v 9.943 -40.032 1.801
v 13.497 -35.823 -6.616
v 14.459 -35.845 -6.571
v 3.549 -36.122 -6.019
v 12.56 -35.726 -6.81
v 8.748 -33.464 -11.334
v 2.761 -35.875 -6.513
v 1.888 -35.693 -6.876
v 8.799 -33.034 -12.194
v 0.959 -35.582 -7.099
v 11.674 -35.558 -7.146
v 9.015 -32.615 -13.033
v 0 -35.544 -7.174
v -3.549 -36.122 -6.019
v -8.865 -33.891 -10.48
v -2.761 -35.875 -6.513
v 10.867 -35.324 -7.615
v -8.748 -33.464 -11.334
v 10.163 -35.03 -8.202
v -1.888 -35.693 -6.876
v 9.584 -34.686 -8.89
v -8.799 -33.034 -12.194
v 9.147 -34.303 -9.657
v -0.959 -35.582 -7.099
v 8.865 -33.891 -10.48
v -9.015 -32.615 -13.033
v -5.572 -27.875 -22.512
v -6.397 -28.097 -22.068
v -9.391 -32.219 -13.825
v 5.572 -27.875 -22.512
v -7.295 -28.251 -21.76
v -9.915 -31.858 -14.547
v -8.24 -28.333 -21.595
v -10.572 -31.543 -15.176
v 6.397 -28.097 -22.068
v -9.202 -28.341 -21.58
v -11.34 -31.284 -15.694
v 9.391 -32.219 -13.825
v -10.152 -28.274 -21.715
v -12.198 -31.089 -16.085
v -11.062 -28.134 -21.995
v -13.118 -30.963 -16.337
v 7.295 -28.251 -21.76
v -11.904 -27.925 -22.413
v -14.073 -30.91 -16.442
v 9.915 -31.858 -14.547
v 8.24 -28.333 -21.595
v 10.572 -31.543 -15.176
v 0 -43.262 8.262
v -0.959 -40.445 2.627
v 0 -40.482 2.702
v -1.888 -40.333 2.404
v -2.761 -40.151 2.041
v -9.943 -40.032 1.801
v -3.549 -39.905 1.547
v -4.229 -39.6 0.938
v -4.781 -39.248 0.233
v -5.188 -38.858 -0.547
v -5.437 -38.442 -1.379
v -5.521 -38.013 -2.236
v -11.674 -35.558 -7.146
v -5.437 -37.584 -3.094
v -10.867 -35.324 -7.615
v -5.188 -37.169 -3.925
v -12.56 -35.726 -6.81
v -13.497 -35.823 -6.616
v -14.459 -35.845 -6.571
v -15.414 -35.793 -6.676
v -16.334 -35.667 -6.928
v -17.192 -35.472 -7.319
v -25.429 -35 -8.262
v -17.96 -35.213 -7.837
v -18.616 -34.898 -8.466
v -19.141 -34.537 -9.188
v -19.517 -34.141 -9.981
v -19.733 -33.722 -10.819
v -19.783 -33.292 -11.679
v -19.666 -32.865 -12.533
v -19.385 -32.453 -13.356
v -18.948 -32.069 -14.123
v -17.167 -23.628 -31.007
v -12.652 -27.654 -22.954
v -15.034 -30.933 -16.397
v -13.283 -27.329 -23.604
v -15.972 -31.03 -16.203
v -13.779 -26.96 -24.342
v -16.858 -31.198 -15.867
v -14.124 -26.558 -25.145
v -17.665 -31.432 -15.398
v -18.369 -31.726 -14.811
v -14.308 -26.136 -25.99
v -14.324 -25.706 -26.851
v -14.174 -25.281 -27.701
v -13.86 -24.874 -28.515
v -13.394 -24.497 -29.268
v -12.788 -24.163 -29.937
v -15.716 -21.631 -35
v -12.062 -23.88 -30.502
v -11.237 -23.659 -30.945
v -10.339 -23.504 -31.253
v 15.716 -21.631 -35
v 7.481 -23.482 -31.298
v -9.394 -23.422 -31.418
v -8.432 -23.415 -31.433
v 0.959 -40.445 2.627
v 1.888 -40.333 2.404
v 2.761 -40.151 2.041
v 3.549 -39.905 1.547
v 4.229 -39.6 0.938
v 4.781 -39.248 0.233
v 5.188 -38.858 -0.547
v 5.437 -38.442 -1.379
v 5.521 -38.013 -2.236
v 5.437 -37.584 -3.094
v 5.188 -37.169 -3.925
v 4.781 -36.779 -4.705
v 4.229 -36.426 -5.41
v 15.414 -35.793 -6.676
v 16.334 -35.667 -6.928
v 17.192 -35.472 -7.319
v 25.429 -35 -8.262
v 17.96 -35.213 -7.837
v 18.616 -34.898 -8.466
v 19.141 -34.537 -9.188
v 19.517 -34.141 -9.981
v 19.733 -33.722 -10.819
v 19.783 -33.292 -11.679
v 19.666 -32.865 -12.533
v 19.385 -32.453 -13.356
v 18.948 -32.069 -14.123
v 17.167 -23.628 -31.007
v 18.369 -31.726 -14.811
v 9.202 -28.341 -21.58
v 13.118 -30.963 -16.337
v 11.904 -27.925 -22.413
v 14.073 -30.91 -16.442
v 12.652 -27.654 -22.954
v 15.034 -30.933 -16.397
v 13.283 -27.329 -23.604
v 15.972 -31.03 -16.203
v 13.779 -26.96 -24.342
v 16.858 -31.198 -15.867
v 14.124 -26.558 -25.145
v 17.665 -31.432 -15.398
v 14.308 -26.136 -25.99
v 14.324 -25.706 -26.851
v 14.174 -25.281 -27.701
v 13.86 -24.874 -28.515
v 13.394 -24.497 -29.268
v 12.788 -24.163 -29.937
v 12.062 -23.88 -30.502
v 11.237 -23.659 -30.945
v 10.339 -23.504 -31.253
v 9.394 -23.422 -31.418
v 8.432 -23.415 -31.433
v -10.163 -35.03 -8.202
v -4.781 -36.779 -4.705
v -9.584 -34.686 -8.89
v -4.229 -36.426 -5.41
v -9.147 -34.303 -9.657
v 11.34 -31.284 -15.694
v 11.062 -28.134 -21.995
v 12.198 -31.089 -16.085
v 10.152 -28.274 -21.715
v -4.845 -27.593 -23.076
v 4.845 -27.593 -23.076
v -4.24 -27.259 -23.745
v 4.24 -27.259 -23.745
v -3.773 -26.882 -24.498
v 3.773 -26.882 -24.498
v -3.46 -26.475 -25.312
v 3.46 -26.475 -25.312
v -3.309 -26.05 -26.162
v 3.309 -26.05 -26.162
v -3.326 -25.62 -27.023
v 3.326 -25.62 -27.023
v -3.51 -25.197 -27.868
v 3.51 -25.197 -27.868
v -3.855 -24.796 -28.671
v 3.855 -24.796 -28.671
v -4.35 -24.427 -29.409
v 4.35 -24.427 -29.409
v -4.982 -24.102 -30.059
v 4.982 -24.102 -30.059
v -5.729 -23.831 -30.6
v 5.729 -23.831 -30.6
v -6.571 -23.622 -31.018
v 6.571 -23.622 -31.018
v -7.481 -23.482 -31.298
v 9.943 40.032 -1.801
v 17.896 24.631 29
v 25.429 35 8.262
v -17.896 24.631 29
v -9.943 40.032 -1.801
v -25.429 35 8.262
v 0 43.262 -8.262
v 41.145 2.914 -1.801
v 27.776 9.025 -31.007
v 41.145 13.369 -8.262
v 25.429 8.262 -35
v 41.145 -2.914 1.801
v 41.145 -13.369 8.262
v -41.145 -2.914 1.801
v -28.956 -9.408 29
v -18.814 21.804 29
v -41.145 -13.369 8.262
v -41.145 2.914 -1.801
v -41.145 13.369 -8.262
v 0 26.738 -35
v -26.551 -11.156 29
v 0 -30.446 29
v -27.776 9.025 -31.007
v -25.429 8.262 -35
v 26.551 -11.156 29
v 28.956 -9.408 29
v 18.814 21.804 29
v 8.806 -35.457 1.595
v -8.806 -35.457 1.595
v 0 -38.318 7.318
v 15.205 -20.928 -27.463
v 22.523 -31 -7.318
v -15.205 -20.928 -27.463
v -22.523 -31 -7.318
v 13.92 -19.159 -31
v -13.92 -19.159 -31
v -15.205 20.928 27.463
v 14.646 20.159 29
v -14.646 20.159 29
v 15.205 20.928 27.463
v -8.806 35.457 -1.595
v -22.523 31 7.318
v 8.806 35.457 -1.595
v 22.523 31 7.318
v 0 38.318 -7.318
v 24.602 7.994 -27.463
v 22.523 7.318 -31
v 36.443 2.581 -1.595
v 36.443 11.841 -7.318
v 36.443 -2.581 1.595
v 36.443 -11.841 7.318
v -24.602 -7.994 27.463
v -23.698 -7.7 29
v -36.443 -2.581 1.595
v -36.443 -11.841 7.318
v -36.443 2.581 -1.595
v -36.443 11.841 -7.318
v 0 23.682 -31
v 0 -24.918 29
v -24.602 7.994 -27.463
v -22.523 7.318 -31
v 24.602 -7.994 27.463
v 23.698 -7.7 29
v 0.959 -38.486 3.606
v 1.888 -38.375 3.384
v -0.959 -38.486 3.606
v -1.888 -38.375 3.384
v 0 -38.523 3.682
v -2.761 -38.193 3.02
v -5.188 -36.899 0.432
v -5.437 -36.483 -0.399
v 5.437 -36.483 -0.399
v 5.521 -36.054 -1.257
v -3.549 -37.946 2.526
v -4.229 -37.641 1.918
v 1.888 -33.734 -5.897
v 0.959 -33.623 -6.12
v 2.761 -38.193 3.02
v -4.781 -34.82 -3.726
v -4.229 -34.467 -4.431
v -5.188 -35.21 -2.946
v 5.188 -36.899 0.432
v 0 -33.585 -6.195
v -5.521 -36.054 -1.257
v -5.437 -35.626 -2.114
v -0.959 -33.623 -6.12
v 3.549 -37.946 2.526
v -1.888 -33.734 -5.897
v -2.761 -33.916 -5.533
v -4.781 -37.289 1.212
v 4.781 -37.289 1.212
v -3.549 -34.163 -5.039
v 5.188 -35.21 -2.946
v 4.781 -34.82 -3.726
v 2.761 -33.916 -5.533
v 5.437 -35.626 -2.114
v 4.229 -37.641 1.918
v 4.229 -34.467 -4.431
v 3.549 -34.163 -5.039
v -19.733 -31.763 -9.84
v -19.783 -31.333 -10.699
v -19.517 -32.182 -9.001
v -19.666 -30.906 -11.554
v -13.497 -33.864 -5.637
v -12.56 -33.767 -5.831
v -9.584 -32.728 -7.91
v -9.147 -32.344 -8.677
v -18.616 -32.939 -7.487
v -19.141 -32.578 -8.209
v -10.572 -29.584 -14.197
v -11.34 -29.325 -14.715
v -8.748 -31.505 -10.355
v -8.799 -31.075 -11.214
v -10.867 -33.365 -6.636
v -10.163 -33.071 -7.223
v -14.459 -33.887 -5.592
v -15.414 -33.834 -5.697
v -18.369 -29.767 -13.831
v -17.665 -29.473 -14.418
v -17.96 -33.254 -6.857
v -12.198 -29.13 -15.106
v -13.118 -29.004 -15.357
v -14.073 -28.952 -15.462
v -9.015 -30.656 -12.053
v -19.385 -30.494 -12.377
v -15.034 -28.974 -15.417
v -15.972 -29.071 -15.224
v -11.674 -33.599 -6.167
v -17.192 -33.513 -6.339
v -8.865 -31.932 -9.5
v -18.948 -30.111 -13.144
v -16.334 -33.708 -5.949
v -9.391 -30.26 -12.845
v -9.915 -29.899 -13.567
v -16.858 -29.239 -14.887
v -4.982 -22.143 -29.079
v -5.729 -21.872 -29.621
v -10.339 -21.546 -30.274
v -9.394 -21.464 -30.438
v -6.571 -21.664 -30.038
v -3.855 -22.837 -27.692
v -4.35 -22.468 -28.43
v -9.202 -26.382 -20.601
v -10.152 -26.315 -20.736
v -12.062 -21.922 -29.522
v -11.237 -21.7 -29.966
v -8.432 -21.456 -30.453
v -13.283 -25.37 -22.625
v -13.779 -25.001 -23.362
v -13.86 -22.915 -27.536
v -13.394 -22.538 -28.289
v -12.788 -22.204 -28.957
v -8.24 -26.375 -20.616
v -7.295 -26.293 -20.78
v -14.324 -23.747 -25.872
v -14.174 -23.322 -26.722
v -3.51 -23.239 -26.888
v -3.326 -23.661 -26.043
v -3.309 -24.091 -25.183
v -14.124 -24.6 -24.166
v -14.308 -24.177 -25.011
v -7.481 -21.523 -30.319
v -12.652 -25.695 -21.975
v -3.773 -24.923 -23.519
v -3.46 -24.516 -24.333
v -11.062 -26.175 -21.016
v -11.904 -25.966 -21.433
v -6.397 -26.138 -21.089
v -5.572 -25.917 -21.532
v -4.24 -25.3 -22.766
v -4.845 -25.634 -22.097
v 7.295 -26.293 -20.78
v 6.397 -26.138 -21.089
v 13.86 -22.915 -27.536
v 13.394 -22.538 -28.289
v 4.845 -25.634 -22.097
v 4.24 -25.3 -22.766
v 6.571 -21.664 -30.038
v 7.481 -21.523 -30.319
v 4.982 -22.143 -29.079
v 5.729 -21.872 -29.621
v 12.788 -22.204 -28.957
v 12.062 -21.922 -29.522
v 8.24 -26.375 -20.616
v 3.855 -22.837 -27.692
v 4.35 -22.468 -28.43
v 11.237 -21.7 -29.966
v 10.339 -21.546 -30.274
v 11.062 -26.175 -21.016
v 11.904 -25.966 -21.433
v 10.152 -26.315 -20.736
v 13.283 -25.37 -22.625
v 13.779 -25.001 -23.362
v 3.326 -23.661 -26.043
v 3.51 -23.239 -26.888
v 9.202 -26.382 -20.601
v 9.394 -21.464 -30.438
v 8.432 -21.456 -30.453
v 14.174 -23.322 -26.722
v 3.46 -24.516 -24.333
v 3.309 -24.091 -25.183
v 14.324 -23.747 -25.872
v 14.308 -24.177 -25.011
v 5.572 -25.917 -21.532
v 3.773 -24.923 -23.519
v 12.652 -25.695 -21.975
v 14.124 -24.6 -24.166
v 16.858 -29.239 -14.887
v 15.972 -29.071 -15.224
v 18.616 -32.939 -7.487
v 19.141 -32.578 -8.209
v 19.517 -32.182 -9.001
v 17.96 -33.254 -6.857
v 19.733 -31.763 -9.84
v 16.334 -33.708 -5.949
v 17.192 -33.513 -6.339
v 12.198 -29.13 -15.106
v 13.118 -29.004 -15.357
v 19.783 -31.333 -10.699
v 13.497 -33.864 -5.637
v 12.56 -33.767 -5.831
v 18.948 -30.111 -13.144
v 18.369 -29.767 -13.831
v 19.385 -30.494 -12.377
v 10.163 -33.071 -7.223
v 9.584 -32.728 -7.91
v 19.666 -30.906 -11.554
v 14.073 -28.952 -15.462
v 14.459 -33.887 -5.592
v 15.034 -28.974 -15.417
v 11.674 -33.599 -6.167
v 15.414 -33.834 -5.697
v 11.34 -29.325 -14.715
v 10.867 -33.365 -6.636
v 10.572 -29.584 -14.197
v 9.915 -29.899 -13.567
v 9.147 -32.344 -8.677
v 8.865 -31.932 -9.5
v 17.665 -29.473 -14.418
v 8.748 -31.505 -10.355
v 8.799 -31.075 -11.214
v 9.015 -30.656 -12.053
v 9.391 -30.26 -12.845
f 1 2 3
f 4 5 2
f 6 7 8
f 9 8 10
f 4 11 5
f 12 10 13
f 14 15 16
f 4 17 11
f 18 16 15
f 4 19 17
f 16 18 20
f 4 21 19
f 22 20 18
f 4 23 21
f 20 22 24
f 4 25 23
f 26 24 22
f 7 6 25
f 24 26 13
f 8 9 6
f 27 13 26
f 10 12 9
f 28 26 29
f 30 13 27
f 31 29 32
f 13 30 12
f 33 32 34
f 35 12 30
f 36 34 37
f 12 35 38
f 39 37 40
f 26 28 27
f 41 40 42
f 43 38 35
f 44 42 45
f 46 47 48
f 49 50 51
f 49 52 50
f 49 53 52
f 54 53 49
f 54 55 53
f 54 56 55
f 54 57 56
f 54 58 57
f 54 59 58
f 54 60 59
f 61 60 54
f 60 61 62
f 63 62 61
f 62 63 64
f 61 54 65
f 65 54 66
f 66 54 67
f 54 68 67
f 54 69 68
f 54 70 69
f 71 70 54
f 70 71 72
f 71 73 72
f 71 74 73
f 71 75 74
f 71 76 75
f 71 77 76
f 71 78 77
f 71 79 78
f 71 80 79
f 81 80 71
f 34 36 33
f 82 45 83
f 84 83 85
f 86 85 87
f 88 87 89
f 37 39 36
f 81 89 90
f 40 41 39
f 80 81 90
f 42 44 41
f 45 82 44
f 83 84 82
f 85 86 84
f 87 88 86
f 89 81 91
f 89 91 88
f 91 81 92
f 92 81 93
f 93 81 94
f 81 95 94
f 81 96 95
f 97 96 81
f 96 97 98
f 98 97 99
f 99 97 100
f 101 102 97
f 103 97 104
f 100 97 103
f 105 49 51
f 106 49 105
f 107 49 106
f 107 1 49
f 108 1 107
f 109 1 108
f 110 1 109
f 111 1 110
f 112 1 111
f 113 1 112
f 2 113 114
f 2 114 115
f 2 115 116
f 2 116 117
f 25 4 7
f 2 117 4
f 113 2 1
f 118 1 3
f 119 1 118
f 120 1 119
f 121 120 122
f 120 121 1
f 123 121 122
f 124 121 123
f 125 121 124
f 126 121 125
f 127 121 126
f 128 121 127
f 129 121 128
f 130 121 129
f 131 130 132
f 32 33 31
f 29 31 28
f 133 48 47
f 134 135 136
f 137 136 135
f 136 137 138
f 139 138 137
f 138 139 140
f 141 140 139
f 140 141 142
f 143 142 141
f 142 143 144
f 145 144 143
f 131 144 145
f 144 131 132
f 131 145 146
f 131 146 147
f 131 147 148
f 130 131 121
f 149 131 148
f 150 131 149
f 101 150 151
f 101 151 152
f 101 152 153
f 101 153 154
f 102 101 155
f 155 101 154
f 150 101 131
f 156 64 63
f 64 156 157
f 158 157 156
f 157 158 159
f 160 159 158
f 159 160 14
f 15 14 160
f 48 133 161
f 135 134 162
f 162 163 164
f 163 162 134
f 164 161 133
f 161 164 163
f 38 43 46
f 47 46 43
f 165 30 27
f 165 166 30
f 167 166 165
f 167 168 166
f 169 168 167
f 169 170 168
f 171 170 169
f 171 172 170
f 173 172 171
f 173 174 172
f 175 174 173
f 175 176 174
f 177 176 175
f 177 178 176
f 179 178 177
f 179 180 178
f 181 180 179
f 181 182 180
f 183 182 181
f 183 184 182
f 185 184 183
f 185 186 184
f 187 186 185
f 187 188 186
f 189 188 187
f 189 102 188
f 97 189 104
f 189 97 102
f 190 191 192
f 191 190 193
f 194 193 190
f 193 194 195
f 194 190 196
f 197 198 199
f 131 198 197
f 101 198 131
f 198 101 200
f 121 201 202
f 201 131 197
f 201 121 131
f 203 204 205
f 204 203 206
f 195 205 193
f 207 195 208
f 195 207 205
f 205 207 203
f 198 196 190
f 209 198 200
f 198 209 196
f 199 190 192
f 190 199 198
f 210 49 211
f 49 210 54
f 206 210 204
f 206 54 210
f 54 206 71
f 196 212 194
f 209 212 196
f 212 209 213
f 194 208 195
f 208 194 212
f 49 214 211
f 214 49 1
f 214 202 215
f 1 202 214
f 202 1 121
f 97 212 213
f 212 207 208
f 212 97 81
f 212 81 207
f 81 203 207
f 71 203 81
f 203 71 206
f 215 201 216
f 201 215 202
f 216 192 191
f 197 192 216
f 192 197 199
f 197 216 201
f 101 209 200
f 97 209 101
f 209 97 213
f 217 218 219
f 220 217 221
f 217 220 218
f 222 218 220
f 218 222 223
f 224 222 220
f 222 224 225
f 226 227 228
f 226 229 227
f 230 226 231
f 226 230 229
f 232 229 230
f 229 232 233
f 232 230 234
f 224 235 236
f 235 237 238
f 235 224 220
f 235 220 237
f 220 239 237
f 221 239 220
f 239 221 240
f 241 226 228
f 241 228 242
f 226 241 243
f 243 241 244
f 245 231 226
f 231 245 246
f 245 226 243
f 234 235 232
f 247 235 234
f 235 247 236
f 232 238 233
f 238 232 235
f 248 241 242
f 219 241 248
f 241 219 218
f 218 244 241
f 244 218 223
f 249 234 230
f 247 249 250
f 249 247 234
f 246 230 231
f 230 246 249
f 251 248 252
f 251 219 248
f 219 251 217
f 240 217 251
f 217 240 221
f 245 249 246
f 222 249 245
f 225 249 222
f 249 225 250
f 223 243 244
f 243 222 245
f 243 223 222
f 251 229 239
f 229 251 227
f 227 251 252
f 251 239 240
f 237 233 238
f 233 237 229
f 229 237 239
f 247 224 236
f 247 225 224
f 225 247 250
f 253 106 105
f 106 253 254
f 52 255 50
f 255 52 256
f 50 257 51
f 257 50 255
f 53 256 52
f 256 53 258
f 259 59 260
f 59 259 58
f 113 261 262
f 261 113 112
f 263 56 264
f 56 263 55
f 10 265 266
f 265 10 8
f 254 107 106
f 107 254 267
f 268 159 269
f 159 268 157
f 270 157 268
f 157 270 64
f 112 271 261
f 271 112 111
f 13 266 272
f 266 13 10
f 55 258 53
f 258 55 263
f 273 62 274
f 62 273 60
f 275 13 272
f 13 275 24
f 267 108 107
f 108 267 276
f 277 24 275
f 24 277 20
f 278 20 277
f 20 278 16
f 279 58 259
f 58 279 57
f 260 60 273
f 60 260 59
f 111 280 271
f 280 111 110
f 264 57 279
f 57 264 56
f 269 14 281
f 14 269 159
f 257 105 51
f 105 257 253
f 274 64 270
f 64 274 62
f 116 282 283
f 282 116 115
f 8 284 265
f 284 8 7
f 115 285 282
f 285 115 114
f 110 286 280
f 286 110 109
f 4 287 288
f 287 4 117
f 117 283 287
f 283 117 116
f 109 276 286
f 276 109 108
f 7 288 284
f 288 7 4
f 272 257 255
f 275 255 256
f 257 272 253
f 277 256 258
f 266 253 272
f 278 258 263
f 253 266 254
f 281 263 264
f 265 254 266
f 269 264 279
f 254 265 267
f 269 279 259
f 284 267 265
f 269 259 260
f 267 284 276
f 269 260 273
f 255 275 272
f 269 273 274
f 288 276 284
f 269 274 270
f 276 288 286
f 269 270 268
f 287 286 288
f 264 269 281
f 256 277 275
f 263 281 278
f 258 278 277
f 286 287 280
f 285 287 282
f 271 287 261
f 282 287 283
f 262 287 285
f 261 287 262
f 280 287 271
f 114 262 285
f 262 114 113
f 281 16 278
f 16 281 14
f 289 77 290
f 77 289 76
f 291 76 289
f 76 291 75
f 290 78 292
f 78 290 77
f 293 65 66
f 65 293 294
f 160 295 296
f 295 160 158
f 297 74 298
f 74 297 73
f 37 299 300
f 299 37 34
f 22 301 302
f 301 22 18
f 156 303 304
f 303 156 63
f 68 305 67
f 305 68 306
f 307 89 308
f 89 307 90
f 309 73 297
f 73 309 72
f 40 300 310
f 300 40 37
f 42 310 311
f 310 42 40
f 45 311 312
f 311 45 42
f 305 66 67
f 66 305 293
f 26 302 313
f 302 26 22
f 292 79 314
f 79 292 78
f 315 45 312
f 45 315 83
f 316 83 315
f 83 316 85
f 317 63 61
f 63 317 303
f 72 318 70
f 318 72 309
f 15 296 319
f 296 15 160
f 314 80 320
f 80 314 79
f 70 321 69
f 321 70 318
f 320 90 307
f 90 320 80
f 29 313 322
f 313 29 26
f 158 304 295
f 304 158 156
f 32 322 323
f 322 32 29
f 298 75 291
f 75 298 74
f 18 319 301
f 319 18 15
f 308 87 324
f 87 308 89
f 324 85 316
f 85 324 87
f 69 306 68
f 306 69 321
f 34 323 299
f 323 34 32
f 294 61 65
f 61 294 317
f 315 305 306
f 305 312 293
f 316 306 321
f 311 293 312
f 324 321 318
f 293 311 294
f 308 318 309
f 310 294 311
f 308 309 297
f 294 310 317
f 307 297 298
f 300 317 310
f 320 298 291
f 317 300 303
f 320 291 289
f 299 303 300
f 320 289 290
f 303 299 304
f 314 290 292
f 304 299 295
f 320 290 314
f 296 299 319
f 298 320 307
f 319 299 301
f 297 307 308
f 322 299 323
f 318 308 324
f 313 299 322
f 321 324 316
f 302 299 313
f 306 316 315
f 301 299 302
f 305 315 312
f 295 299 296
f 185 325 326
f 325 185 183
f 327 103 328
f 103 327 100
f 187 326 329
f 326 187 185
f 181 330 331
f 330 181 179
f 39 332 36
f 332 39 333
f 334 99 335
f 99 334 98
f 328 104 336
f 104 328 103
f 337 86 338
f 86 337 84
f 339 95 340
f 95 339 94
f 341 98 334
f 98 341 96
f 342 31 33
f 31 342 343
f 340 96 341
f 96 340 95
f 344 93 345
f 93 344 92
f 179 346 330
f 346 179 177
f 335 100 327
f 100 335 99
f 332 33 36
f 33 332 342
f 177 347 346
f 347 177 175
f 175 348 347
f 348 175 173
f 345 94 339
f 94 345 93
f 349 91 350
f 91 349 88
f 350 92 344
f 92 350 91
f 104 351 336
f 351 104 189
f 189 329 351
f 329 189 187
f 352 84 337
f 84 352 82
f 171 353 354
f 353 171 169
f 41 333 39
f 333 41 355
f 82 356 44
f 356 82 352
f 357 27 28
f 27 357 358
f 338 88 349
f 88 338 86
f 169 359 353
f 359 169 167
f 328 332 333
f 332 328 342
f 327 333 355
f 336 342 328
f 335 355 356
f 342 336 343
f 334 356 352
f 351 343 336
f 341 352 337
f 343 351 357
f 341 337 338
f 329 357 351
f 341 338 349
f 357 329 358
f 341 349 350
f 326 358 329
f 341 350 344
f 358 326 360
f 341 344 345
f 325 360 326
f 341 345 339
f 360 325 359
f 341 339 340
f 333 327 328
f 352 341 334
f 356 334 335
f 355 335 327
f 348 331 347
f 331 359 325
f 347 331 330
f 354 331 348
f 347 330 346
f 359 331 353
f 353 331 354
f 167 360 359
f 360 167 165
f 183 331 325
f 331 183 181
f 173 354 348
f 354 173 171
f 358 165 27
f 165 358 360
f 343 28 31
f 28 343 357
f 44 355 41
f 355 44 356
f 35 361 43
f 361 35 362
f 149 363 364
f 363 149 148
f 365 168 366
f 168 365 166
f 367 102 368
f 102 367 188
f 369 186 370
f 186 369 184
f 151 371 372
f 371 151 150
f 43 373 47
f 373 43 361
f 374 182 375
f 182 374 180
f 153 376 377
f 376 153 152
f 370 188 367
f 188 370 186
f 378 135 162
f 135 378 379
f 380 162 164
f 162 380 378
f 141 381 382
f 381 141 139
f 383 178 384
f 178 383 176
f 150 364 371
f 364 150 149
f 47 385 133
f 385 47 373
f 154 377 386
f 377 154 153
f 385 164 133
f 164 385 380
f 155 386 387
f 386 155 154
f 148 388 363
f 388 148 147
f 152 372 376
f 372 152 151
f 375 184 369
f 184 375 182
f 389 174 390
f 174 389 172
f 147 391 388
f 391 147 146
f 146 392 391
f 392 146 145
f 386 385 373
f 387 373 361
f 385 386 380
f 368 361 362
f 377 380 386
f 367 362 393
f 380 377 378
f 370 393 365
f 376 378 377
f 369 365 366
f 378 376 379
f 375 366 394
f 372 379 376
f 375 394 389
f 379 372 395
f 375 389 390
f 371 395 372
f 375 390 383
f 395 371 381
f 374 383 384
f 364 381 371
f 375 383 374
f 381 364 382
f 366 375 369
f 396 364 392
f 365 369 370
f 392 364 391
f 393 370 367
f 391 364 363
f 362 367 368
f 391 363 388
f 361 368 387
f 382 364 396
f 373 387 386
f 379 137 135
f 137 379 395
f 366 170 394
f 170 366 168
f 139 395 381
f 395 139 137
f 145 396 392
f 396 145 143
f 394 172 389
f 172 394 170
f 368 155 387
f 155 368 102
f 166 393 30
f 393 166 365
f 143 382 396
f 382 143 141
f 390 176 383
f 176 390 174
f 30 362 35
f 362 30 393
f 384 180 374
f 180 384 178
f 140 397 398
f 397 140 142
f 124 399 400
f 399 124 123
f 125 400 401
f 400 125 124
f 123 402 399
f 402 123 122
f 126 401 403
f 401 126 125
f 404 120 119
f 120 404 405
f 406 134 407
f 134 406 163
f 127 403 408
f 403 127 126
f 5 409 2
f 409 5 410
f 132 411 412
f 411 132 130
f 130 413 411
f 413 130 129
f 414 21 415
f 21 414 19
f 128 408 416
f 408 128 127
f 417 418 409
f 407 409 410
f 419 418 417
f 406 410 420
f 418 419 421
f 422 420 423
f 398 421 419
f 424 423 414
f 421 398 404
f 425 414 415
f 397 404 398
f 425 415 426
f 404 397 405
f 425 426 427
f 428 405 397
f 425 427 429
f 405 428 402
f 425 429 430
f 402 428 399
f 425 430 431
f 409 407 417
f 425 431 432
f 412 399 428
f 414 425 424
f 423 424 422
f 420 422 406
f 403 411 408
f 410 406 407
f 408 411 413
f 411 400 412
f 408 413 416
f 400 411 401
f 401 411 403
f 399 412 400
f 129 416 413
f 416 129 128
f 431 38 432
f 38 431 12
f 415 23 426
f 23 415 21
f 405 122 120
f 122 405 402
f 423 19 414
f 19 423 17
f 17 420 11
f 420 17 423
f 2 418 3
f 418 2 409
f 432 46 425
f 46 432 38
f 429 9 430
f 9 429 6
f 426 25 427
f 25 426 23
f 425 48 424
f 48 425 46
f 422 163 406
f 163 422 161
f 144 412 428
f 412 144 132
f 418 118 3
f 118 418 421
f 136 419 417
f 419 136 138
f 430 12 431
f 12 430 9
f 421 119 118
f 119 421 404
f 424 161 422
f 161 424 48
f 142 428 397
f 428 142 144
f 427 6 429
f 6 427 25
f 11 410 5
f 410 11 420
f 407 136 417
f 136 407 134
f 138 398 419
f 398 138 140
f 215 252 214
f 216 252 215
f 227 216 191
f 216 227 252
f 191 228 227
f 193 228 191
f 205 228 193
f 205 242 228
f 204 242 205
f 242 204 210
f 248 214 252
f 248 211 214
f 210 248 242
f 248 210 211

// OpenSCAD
module dodecahedron(height) {
	scale([height,height,height]) {
		intersection() { 
			cube([2,2,1], center = true); 
			intersection_for(i=[0:4]) { 
				rotate([0,0,72*i])
					rotate([116.565,0,0])
					cube([2,2,1], center = true); 
			}
		}
	}
}

module cylinder_outer(h, r, fn) {
	fudge = 1/cos(180/fn);
	cylinder(h=h,r=r*fudge,$fn=fn);
}

difference() {
  dodecahedron(70);
  dodecahedron(62);
  translate([0,0,35]) cube([100,100,12],center=true);
  rotate([116.565,0,0]) translate([0, 0, 34]) {
	for(a=[0,72,144,216,288]) rotate([0,0,a+90]) translate([15,0,-1.19]) cylinder_outer(h=2.2, r=5.5, fn=36);
  }
}
